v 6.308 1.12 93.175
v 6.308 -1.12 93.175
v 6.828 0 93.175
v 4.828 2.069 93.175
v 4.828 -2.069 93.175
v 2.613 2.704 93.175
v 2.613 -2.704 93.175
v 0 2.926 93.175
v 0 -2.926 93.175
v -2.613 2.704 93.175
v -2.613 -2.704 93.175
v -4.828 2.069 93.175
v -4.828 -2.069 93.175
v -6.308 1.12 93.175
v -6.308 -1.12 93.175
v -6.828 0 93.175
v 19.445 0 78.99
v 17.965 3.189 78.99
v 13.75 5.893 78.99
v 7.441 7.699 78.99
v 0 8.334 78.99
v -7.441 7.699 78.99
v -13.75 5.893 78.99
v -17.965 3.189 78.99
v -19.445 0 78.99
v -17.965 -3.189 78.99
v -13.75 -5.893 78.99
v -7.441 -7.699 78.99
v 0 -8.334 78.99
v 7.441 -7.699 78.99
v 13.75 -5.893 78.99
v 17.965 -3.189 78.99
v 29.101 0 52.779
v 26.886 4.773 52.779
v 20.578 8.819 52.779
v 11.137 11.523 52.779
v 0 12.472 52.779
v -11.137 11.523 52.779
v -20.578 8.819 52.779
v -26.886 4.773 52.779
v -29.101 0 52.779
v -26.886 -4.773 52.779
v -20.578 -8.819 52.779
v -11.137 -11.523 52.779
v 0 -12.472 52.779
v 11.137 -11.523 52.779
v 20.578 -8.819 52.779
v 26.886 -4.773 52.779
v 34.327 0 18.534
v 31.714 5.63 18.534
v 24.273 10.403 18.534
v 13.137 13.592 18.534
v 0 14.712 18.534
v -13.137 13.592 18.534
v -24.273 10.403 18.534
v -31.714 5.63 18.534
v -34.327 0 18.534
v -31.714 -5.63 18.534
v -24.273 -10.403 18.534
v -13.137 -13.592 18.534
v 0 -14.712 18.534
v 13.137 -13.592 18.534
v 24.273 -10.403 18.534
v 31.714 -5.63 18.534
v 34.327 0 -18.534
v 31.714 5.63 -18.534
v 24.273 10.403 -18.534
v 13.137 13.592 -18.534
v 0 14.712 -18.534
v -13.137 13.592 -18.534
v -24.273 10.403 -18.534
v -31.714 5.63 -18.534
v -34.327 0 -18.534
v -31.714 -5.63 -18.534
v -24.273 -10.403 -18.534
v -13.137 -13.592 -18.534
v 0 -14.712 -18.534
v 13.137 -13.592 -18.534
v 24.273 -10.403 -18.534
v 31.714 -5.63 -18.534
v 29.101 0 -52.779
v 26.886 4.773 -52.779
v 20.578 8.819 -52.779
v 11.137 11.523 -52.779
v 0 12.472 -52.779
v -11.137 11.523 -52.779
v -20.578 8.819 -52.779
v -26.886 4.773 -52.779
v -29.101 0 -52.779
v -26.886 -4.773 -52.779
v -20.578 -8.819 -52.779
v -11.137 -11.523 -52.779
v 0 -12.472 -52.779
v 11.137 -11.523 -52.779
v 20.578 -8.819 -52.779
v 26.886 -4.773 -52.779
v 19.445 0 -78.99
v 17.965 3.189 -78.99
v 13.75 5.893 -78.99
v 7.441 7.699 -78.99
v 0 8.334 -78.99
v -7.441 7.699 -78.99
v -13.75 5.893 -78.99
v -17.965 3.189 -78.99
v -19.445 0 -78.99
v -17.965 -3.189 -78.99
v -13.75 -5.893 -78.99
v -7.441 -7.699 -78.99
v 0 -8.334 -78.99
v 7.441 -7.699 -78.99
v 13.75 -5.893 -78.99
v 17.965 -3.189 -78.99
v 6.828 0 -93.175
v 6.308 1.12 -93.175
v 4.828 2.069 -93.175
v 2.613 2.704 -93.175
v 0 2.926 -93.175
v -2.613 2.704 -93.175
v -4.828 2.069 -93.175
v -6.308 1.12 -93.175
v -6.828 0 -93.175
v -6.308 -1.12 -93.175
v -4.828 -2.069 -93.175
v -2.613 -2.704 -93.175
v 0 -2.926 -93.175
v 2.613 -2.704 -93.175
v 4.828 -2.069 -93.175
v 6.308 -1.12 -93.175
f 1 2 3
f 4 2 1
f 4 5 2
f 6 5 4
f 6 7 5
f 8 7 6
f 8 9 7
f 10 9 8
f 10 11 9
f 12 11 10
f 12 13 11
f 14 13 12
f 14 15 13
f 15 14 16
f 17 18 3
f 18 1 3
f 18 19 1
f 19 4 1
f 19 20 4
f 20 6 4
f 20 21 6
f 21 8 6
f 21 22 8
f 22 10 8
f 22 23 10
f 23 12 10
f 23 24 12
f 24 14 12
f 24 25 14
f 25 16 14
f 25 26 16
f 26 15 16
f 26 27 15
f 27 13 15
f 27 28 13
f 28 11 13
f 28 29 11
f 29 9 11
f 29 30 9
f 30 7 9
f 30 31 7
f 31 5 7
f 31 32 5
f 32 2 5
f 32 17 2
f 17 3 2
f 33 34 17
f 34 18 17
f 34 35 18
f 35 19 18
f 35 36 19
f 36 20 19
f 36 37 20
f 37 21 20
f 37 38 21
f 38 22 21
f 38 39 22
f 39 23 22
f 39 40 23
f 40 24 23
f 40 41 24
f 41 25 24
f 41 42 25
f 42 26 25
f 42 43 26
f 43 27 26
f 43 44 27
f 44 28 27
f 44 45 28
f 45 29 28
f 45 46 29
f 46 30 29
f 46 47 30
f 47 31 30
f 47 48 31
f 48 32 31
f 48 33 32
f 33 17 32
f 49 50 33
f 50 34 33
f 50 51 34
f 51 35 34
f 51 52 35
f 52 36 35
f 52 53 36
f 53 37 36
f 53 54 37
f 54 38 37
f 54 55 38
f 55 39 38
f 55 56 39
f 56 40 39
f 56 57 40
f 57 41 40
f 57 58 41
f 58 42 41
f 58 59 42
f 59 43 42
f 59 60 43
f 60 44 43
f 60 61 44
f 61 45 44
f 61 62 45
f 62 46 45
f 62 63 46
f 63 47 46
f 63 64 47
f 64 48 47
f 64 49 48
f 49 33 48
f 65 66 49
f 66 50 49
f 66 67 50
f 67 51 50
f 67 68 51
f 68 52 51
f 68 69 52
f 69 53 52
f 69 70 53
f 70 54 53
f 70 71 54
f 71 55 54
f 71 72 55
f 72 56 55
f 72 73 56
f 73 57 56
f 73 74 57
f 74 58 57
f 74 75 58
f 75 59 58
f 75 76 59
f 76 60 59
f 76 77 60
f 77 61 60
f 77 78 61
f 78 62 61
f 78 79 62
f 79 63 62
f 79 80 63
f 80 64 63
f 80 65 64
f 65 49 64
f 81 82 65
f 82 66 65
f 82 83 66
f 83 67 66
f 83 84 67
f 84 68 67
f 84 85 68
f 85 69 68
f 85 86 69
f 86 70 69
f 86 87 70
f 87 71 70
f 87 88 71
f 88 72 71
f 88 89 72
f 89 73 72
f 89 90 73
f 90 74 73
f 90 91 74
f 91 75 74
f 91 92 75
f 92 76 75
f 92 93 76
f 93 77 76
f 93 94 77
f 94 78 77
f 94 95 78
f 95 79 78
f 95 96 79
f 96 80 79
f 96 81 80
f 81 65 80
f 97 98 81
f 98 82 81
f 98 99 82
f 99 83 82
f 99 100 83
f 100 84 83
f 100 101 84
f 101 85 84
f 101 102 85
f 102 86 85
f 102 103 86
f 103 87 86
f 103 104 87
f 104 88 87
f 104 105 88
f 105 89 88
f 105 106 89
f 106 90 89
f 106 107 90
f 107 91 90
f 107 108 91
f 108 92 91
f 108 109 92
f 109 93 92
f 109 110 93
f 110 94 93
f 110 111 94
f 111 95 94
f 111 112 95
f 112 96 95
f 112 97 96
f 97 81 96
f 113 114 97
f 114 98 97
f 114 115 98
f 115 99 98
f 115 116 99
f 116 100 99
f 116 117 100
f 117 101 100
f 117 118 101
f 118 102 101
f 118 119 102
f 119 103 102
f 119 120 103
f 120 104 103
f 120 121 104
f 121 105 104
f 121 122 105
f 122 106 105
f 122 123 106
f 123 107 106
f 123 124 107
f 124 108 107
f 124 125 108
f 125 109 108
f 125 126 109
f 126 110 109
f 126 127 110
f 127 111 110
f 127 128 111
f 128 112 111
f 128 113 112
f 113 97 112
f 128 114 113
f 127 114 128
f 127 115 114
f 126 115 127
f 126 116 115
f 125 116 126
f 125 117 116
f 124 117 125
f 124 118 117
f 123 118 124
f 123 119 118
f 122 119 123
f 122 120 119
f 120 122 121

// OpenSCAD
// Generated by SolidPython 1.0.1 on 2020-07-29 00:46:47


scale(v = [7, 3, 19]) {
	sphere(r = 5);
}
/***********************************************
*********      SolidPython code:      **********
************************************************
 
# import packages: SolidPython
from solid import *
from solid.utils import *
from itertools import chain, combinations, permutations


class Resize:

    def __init__(self, scad_file):
        self.scad_file = scad_file
        #self.scad_file = import_scad(scad_file)
        # cone/cylinder param:
        self.r1 = 0
        self.r2 = 0
        self.h = 0
        # rectangular prism param:
        self.w = 0
        self.l = 0
        # ellipse param:
        self.r = 0

    # import OpenScad code (file name corresponds to shape)


    # classify shape + parameters
    def assign(self, param1, param2, param3):
        if self.scad_file == 'cone.scad':
            self.r1 = param1
            self.r2 = param2
            self.h = param3
        elif self.scad_file == 'cylinder.scad':
            self.r1 = param1
            self.r2 = param2
            self.h = param3
        elif self.scad_file == 'rectangularPrism.scad':
            self.h = param1
            self.l = param2
            self.w = param3
        else:
            self.r = param1
            self.h = param2

    # resize parameters
    def iterate(self):
        x = range(3, 20, 2)
        i = 1
        if self.scad_file == 'cone.scad':
            tempList = list(permutations(x, 2))
            for temp in tempList:
                param1 = temp[0]
                param2 = temp[1]
                filepath = 'produced_scad_files/' + 'cone' + str(param1) + '_' + str(param2) + '_' + '.scad'
                scad_render_to_file(cylinder(h=param1, r1=param2, r2=0), filepath)

        elif self.scad_file == 'cylinder.scad':
            tempList = list(permutations(x, 3))
            for temp in tempList:
                param1 = temp[0]
                param2 = temp[1]
                filepath = 'produced_scad_files/' + 'cylinder' + str(param1) + '_' + str(param2) + '_' + '.scad'
                scad_render_to_file(cylinder(h=param1, r1=param2, r2=param2), filepath)

        elif self.scad_file == 'rectangularPrism.scad':
            tempList = list(permutations(x, 3))
            for temp in tempList:
                param1 = temp[0]
                param2 = temp[1]
                param3 = temp[2]
                filepath = 'produced_scad_files/' + 'rectangularPrism' + str(param1) + '_' + str(param2) + '_' + str(
                    param3) + '.scad'
                scad_render_to_file(cube(size=(param1, param2, param3)), filepath)

        elif self.scad_file == 'ellipse.scad':
            tempList = list(permutations(x, 4))
            for temp in tempList:
                param1 = temp[0]
                param2 = temp[1]
                param3 = temp[2]
                param4 = temp[3]
                filepath = 'produced_scad_files/' + 'ellipse' + str(param1) + '_' + str(param2) + '_' + str(param3) + '_' + str(param4) + '.scad'
                scad_render_to_file(scale([param1, param2, param3])(sphere(r=param4)), filepath)

    def render_to_scadfile(self):
        scad_render_to_file(scad, 'example.scad') 
 
************************************************/
